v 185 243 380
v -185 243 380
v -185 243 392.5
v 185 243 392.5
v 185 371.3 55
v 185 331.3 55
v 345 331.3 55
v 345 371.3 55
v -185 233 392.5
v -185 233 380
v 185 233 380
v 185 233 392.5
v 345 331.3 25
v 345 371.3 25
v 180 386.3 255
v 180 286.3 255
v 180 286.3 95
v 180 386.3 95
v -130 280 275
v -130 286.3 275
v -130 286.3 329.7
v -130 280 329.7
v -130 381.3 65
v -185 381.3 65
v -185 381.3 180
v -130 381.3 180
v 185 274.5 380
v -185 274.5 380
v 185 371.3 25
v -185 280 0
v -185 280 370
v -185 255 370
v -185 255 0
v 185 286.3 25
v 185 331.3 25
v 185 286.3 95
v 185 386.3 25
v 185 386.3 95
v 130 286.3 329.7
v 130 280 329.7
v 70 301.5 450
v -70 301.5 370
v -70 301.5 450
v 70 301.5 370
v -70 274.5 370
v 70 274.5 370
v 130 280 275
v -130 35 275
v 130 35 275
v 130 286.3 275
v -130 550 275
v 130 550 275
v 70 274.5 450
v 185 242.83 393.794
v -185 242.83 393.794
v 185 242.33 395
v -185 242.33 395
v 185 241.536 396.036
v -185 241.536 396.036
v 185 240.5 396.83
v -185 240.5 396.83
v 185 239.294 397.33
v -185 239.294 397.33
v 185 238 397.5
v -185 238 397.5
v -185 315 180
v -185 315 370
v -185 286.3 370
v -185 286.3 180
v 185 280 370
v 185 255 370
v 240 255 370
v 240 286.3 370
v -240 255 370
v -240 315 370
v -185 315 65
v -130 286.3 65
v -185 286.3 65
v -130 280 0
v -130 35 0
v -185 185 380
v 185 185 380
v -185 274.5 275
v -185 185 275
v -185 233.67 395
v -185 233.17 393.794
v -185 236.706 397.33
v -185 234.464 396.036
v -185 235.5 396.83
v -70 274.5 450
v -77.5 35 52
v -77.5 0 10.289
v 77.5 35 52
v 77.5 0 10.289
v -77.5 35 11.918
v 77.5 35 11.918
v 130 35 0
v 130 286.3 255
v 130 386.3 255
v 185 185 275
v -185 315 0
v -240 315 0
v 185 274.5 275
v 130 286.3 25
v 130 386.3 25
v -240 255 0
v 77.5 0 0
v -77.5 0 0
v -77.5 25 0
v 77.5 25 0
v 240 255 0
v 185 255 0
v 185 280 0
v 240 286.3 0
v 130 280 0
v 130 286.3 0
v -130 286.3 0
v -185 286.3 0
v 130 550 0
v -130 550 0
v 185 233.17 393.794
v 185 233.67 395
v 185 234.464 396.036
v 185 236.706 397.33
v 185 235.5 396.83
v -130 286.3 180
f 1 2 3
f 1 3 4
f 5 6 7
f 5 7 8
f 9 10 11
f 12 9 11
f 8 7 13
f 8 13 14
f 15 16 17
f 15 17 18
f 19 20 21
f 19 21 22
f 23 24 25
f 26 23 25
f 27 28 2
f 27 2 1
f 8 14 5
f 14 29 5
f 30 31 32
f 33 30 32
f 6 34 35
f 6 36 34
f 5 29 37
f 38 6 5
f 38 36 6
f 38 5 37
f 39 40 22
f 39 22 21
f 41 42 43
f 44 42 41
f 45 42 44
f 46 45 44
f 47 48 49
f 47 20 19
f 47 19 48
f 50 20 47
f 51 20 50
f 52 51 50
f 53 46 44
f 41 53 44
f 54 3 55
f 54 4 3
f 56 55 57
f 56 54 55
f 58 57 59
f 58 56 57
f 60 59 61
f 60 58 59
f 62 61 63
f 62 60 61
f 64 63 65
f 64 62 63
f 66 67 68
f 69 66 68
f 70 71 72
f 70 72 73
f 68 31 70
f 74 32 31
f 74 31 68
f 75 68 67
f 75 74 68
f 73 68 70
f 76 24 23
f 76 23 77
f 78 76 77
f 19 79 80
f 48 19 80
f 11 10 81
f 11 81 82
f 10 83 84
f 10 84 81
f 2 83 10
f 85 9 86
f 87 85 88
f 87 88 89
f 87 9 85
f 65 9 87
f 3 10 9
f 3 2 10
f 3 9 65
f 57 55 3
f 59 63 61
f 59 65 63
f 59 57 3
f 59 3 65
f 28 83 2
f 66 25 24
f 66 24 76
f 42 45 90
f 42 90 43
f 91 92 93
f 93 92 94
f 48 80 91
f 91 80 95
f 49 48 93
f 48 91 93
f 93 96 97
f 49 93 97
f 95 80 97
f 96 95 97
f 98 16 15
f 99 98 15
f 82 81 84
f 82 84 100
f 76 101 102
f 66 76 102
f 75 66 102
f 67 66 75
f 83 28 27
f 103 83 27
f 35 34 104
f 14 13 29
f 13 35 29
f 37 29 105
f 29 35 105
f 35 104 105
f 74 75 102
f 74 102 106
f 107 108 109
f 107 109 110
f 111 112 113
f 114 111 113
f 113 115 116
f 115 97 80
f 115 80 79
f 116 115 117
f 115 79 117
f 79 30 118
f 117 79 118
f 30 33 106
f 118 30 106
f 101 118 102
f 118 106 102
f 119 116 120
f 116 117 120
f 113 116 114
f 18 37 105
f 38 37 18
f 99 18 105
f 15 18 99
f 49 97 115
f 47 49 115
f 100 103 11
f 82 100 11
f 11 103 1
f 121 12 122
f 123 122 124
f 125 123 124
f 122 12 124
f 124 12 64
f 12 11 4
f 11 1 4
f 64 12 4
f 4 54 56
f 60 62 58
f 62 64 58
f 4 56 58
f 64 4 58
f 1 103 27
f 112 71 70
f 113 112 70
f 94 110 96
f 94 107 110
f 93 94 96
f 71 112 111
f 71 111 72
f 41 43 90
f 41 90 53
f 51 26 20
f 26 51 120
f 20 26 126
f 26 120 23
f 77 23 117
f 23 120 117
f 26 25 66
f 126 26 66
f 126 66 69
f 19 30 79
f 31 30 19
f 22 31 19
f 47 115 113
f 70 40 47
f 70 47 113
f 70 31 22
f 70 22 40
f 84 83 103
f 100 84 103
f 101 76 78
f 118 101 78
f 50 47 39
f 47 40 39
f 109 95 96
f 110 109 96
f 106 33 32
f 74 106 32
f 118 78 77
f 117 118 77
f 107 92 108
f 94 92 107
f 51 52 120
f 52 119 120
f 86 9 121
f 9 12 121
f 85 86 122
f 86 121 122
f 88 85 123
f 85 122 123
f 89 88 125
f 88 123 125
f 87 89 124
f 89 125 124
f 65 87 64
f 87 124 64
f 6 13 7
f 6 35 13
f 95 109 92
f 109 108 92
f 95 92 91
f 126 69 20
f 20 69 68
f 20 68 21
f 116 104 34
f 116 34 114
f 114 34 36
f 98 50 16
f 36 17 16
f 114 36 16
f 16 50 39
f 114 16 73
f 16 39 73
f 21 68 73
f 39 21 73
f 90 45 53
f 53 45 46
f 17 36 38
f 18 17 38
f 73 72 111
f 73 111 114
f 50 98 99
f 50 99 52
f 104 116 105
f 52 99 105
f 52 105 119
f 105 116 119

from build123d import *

# Parameters (mm, degrees)
F0_W      = 155
F0_H      = 52
F1_DEPTH  = 65
F2_SIZE2  = 41.7113757408
F2_SIZE   = 35
F3_SIZE2  = 47.6701437038
F3_SIZE   = 40
F4_W      = 60.4387485981
F4_H      = 52
F5_DEPTH  = 155.001
F6_W      = 260
F6_H      = 75
F7_DEPTH  = 435
F8_W      = 6.3
F8_H      = 370
F9_DEPTH  = 55
F10_W     = 6.3
F10_H     = 40.3
F11_DEPTH = 260
F12_W     = 55
F12_H     = 370
F13_DEPTH = 6.3
F14_W     = 95
F14_H     = 115
F15_DEPTH = 55
F16_W     = 100
F16_H     = 230
F17_DEPTH = 55
F18_W     = 260
F18_H     = 75
F19_DEPTH = 80
F20_W     = 40
F20_H     = 30
F21_DEPTH = 60
F22_W     = 60
F22_H     = 370
F23_DEPTH = 55
F24_W     = 60
F24_H     = 370
F25_DEPTH = 55
F27_DEPTH = 55
F29_DEPTH = 200
F30_W     = 370
F30_H     = 105
F31_DEPTH = 95
F32_W     = 370
F32_H     = 10
F33_DEPTH = 17.5
F34_R     = 4.99999
F35_W     = 370
F35_H     = 5.5
F36_DEPTH = 105
F37_W     = 140
F37_H     = 27
F38_DEPTH = 80
F39_DEPTH = 100
F40_W     = 100
F40_H     = 160
F41_DEPTH = 5


# Not quite as in the source:
# - a fillet or chamfer is up to 0.001 mm smaller than in the source, because OpenCascade refuses the exact size


with BuildPart() as f1:
    # F0 (on Front) → F1 (new body)
    with BuildSketch(Plane.XZ):
        with Locations((0, 26)):
            Rectangle(F0_W, F0_H)
    extrude(amount=-F1_DEPTH)

    # F2
    f2_edges = [f1.edges().sort_by_distance(p)[0] for p in [
        (0, 0, 52),
    ]]
    f2_side = f1.faces().sort_by_distance((0, 32.5, 52))[0]
    chamfer(f2_edges, length=F2_SIZE, length2=F2_SIZE2, reference=f2_side)

    # F3
    f3_edges = [f1.edges().sort_by_distance(p)[0] for p in [
        (0, 65, 0),
    ]]
    f3_side = f1.faces().sort_by_distance((0, 32.5, 0))[0]
    chamfer(f3_edges, length=F3_SIZE, length2=F3_SIZE2, reference=f3_side)

    # F4 (on face) → F5 (cut, through all)
    with BuildSketch(Plane(origin=(-77.5, 0, 0), x_dir=(0, -1, 0), z_dir=(-1, 0, 0))):
        with Locations((-65.219374299, 26)):
            Rectangle(F4_W, F4_H)
    extrude(amount=-F5_DEPTH, mode=Mode.SUBTRACT)

    # F6 (on face) → F7 (join)
    with BuildSketch(Plane(origin=(0, 35, 0), x_dir=(-1, 0, 0), z_dir=(0, 1, 0))):
        with Locations((0, 37.5)):
            Rectangle(F6_W, F6_H)
    extrude(amount=F7_DEPTH)

    # F8 (on face) → F9 (join)
    with BuildSketch(Plane(origin=(-130, 0, 0), x_dir=(0, -1, 0), z_dir=(-1, 0, 0))):
        with Locations((-283.15, 185)):
            Rectangle(F8_W, F8_H)
    extrude(amount=F9_DEPTH)

    # F10 (on face) → F11 (join)
    with BuildSketch(Plane.YZ.offset(-130)):
        with Locations((283.15, 349.85)):
            Rectangle(F10_W, F10_H)
    extrude(amount=F11_DEPTH)

    # F12 (on face) → F13 (join)
    with BuildSketch(Plane.XZ.offset(-280)):
        with Locations((157.5, 185)):
            Rectangle(F12_W, F12_H)
    extrude(amount=-F13_DEPTH)

    # F14 (on face) → F15 (join)
    with BuildSketch(Plane(origin=(-185, 0, 0), x_dir=(0, -1, 0), z_dir=(-1, 0, 0))):
        with Locations((-333.8, 122.5)):
            Rectangle(F14_W, F14_H)
    extrude(amount=-F15_DEPTH)

    # F16 (on face) → F17 (join)
    with BuildSketch(Plane.YZ.offset(185)):
        with Locations((336.3, 140)):
            Rectangle(F16_W, F16_H)
    extrude(amount=-F17_DEPTH)

    # F18 (on face) → F19 (join)
    with BuildSketch(Plane(origin=(0, 470, 0), x_dir=(-1, 0, 0), z_dir=(0, 1, 0))):
        with Locations((0, 37.5)):
            Rectangle(F18_W, F18_H)
    extrude(amount=F19_DEPTH)

    # F20 (on face) → F21 (join)
    with BuildSketch(Plane.YZ.offset(185)):
        with Locations((351.3, 40)):
            Rectangle(F20_W, F20_H)
    extrude(amount=F21_DEPTH)

    # F22 (on face) → F23 (join)
    with BuildSketch(Plane(origin=(-185, 0, 0), x_dir=(0, -1, 0), z_dir=(-1, 0, 0))):
        with Locations((-285, 185)):
            Rectangle(F22_W, F22_H)
    extrude(amount=F23_DEPTH)

    # F24 (on face) → F25 (join)
    with BuildSketch(Plane.YZ.offset(185)):
        with Locations((285, 185)):
            Rectangle(F24_W, F24_H)
    extrude(amount=F25_DEPTH)

    # F26 (on face) → F27 (cut)
    with BuildSketch(Plane.YZ.offset(240)):
        Polygon((315, 0), (315, 25), (315, 255), (315, 370), (286.3, 370), (286.3, 255), (286.3, 0), align=None)
    extrude(amount=-F27_DEPTH, mode=Mode.SUBTRACT)

    # F28 (on face) → F29 (join)
    with BuildSketch(Plane.XY.offset(75)):
        Polygon((-130, 381.3), (-130, 280), (-130, 35), (130, 35), (130, 280), (130, 386.3), (130, 550), (-130, 550), align=None)
    extrude(amount=F29_DEPTH)

    # F39 (add): a face of the model
    f39_faces = [f1.faces().sort_by_distance(p)[0] for p in [
        (245, 351.3, 40),
    ]]
    extrude(f39_faces, amount=F39_DEPTH)

    # F40 (on face) → F41 (cut)
    with BuildSketch(Plane.YZ.offset(185)):
        with Locations((336.3, 175)):
            Rectangle(F40_W, F40_H)
    extrude(amount=-F41_DEPTH, mode=Mode.SUBTRACT)


with BuildPart() as f31:
    # F30 (on face) → F31 (new body)
    with BuildSketch(Plane.XZ.offset(-280)):
        with Locations((0, 327.5)):
            Rectangle(F30_W, F30_H)
    extrude(amount=F31_DEPTH)

    # F32 (on face) → F33 (join)
    with BuildSketch(Plane.XY.offset(380)):
        with Locations((0, 238)):
            Rectangle(F32_W, F32_H)
    extrude(amount=F33_DEPTH)

    # F34 (radius 5 in the source; OpenCascade refuses exactly that, so slightly less here)
    f34_edges = [f31.edges().sort_by_distance(p)[0] for p in [
        (0, 233, 397.5),
        (0, 243, 397.5),
    ]]
    fillet(f34_edges, radius=F34_R)

    # F35 (on face) → F36 (cut)
    with BuildSketch(Plane.XY.offset(380)):
        with Locations((0, 277.25)):
            Rectangle(F35_W, F35_H)
    extrude(amount=-F36_DEPTH, mode=Mode.SUBTRACT)


with BuildPart() as f38:
    # F37 (on face) → F38 (new body)
    with BuildSketch(Plane.XY.offset(370)):
        with Locations((0, 288)):
            Rectangle(F37_W, F37_H)
    extrude(amount=F38_DEPTH)


solid = Compound([f1.part, f31.part, f38.part])
